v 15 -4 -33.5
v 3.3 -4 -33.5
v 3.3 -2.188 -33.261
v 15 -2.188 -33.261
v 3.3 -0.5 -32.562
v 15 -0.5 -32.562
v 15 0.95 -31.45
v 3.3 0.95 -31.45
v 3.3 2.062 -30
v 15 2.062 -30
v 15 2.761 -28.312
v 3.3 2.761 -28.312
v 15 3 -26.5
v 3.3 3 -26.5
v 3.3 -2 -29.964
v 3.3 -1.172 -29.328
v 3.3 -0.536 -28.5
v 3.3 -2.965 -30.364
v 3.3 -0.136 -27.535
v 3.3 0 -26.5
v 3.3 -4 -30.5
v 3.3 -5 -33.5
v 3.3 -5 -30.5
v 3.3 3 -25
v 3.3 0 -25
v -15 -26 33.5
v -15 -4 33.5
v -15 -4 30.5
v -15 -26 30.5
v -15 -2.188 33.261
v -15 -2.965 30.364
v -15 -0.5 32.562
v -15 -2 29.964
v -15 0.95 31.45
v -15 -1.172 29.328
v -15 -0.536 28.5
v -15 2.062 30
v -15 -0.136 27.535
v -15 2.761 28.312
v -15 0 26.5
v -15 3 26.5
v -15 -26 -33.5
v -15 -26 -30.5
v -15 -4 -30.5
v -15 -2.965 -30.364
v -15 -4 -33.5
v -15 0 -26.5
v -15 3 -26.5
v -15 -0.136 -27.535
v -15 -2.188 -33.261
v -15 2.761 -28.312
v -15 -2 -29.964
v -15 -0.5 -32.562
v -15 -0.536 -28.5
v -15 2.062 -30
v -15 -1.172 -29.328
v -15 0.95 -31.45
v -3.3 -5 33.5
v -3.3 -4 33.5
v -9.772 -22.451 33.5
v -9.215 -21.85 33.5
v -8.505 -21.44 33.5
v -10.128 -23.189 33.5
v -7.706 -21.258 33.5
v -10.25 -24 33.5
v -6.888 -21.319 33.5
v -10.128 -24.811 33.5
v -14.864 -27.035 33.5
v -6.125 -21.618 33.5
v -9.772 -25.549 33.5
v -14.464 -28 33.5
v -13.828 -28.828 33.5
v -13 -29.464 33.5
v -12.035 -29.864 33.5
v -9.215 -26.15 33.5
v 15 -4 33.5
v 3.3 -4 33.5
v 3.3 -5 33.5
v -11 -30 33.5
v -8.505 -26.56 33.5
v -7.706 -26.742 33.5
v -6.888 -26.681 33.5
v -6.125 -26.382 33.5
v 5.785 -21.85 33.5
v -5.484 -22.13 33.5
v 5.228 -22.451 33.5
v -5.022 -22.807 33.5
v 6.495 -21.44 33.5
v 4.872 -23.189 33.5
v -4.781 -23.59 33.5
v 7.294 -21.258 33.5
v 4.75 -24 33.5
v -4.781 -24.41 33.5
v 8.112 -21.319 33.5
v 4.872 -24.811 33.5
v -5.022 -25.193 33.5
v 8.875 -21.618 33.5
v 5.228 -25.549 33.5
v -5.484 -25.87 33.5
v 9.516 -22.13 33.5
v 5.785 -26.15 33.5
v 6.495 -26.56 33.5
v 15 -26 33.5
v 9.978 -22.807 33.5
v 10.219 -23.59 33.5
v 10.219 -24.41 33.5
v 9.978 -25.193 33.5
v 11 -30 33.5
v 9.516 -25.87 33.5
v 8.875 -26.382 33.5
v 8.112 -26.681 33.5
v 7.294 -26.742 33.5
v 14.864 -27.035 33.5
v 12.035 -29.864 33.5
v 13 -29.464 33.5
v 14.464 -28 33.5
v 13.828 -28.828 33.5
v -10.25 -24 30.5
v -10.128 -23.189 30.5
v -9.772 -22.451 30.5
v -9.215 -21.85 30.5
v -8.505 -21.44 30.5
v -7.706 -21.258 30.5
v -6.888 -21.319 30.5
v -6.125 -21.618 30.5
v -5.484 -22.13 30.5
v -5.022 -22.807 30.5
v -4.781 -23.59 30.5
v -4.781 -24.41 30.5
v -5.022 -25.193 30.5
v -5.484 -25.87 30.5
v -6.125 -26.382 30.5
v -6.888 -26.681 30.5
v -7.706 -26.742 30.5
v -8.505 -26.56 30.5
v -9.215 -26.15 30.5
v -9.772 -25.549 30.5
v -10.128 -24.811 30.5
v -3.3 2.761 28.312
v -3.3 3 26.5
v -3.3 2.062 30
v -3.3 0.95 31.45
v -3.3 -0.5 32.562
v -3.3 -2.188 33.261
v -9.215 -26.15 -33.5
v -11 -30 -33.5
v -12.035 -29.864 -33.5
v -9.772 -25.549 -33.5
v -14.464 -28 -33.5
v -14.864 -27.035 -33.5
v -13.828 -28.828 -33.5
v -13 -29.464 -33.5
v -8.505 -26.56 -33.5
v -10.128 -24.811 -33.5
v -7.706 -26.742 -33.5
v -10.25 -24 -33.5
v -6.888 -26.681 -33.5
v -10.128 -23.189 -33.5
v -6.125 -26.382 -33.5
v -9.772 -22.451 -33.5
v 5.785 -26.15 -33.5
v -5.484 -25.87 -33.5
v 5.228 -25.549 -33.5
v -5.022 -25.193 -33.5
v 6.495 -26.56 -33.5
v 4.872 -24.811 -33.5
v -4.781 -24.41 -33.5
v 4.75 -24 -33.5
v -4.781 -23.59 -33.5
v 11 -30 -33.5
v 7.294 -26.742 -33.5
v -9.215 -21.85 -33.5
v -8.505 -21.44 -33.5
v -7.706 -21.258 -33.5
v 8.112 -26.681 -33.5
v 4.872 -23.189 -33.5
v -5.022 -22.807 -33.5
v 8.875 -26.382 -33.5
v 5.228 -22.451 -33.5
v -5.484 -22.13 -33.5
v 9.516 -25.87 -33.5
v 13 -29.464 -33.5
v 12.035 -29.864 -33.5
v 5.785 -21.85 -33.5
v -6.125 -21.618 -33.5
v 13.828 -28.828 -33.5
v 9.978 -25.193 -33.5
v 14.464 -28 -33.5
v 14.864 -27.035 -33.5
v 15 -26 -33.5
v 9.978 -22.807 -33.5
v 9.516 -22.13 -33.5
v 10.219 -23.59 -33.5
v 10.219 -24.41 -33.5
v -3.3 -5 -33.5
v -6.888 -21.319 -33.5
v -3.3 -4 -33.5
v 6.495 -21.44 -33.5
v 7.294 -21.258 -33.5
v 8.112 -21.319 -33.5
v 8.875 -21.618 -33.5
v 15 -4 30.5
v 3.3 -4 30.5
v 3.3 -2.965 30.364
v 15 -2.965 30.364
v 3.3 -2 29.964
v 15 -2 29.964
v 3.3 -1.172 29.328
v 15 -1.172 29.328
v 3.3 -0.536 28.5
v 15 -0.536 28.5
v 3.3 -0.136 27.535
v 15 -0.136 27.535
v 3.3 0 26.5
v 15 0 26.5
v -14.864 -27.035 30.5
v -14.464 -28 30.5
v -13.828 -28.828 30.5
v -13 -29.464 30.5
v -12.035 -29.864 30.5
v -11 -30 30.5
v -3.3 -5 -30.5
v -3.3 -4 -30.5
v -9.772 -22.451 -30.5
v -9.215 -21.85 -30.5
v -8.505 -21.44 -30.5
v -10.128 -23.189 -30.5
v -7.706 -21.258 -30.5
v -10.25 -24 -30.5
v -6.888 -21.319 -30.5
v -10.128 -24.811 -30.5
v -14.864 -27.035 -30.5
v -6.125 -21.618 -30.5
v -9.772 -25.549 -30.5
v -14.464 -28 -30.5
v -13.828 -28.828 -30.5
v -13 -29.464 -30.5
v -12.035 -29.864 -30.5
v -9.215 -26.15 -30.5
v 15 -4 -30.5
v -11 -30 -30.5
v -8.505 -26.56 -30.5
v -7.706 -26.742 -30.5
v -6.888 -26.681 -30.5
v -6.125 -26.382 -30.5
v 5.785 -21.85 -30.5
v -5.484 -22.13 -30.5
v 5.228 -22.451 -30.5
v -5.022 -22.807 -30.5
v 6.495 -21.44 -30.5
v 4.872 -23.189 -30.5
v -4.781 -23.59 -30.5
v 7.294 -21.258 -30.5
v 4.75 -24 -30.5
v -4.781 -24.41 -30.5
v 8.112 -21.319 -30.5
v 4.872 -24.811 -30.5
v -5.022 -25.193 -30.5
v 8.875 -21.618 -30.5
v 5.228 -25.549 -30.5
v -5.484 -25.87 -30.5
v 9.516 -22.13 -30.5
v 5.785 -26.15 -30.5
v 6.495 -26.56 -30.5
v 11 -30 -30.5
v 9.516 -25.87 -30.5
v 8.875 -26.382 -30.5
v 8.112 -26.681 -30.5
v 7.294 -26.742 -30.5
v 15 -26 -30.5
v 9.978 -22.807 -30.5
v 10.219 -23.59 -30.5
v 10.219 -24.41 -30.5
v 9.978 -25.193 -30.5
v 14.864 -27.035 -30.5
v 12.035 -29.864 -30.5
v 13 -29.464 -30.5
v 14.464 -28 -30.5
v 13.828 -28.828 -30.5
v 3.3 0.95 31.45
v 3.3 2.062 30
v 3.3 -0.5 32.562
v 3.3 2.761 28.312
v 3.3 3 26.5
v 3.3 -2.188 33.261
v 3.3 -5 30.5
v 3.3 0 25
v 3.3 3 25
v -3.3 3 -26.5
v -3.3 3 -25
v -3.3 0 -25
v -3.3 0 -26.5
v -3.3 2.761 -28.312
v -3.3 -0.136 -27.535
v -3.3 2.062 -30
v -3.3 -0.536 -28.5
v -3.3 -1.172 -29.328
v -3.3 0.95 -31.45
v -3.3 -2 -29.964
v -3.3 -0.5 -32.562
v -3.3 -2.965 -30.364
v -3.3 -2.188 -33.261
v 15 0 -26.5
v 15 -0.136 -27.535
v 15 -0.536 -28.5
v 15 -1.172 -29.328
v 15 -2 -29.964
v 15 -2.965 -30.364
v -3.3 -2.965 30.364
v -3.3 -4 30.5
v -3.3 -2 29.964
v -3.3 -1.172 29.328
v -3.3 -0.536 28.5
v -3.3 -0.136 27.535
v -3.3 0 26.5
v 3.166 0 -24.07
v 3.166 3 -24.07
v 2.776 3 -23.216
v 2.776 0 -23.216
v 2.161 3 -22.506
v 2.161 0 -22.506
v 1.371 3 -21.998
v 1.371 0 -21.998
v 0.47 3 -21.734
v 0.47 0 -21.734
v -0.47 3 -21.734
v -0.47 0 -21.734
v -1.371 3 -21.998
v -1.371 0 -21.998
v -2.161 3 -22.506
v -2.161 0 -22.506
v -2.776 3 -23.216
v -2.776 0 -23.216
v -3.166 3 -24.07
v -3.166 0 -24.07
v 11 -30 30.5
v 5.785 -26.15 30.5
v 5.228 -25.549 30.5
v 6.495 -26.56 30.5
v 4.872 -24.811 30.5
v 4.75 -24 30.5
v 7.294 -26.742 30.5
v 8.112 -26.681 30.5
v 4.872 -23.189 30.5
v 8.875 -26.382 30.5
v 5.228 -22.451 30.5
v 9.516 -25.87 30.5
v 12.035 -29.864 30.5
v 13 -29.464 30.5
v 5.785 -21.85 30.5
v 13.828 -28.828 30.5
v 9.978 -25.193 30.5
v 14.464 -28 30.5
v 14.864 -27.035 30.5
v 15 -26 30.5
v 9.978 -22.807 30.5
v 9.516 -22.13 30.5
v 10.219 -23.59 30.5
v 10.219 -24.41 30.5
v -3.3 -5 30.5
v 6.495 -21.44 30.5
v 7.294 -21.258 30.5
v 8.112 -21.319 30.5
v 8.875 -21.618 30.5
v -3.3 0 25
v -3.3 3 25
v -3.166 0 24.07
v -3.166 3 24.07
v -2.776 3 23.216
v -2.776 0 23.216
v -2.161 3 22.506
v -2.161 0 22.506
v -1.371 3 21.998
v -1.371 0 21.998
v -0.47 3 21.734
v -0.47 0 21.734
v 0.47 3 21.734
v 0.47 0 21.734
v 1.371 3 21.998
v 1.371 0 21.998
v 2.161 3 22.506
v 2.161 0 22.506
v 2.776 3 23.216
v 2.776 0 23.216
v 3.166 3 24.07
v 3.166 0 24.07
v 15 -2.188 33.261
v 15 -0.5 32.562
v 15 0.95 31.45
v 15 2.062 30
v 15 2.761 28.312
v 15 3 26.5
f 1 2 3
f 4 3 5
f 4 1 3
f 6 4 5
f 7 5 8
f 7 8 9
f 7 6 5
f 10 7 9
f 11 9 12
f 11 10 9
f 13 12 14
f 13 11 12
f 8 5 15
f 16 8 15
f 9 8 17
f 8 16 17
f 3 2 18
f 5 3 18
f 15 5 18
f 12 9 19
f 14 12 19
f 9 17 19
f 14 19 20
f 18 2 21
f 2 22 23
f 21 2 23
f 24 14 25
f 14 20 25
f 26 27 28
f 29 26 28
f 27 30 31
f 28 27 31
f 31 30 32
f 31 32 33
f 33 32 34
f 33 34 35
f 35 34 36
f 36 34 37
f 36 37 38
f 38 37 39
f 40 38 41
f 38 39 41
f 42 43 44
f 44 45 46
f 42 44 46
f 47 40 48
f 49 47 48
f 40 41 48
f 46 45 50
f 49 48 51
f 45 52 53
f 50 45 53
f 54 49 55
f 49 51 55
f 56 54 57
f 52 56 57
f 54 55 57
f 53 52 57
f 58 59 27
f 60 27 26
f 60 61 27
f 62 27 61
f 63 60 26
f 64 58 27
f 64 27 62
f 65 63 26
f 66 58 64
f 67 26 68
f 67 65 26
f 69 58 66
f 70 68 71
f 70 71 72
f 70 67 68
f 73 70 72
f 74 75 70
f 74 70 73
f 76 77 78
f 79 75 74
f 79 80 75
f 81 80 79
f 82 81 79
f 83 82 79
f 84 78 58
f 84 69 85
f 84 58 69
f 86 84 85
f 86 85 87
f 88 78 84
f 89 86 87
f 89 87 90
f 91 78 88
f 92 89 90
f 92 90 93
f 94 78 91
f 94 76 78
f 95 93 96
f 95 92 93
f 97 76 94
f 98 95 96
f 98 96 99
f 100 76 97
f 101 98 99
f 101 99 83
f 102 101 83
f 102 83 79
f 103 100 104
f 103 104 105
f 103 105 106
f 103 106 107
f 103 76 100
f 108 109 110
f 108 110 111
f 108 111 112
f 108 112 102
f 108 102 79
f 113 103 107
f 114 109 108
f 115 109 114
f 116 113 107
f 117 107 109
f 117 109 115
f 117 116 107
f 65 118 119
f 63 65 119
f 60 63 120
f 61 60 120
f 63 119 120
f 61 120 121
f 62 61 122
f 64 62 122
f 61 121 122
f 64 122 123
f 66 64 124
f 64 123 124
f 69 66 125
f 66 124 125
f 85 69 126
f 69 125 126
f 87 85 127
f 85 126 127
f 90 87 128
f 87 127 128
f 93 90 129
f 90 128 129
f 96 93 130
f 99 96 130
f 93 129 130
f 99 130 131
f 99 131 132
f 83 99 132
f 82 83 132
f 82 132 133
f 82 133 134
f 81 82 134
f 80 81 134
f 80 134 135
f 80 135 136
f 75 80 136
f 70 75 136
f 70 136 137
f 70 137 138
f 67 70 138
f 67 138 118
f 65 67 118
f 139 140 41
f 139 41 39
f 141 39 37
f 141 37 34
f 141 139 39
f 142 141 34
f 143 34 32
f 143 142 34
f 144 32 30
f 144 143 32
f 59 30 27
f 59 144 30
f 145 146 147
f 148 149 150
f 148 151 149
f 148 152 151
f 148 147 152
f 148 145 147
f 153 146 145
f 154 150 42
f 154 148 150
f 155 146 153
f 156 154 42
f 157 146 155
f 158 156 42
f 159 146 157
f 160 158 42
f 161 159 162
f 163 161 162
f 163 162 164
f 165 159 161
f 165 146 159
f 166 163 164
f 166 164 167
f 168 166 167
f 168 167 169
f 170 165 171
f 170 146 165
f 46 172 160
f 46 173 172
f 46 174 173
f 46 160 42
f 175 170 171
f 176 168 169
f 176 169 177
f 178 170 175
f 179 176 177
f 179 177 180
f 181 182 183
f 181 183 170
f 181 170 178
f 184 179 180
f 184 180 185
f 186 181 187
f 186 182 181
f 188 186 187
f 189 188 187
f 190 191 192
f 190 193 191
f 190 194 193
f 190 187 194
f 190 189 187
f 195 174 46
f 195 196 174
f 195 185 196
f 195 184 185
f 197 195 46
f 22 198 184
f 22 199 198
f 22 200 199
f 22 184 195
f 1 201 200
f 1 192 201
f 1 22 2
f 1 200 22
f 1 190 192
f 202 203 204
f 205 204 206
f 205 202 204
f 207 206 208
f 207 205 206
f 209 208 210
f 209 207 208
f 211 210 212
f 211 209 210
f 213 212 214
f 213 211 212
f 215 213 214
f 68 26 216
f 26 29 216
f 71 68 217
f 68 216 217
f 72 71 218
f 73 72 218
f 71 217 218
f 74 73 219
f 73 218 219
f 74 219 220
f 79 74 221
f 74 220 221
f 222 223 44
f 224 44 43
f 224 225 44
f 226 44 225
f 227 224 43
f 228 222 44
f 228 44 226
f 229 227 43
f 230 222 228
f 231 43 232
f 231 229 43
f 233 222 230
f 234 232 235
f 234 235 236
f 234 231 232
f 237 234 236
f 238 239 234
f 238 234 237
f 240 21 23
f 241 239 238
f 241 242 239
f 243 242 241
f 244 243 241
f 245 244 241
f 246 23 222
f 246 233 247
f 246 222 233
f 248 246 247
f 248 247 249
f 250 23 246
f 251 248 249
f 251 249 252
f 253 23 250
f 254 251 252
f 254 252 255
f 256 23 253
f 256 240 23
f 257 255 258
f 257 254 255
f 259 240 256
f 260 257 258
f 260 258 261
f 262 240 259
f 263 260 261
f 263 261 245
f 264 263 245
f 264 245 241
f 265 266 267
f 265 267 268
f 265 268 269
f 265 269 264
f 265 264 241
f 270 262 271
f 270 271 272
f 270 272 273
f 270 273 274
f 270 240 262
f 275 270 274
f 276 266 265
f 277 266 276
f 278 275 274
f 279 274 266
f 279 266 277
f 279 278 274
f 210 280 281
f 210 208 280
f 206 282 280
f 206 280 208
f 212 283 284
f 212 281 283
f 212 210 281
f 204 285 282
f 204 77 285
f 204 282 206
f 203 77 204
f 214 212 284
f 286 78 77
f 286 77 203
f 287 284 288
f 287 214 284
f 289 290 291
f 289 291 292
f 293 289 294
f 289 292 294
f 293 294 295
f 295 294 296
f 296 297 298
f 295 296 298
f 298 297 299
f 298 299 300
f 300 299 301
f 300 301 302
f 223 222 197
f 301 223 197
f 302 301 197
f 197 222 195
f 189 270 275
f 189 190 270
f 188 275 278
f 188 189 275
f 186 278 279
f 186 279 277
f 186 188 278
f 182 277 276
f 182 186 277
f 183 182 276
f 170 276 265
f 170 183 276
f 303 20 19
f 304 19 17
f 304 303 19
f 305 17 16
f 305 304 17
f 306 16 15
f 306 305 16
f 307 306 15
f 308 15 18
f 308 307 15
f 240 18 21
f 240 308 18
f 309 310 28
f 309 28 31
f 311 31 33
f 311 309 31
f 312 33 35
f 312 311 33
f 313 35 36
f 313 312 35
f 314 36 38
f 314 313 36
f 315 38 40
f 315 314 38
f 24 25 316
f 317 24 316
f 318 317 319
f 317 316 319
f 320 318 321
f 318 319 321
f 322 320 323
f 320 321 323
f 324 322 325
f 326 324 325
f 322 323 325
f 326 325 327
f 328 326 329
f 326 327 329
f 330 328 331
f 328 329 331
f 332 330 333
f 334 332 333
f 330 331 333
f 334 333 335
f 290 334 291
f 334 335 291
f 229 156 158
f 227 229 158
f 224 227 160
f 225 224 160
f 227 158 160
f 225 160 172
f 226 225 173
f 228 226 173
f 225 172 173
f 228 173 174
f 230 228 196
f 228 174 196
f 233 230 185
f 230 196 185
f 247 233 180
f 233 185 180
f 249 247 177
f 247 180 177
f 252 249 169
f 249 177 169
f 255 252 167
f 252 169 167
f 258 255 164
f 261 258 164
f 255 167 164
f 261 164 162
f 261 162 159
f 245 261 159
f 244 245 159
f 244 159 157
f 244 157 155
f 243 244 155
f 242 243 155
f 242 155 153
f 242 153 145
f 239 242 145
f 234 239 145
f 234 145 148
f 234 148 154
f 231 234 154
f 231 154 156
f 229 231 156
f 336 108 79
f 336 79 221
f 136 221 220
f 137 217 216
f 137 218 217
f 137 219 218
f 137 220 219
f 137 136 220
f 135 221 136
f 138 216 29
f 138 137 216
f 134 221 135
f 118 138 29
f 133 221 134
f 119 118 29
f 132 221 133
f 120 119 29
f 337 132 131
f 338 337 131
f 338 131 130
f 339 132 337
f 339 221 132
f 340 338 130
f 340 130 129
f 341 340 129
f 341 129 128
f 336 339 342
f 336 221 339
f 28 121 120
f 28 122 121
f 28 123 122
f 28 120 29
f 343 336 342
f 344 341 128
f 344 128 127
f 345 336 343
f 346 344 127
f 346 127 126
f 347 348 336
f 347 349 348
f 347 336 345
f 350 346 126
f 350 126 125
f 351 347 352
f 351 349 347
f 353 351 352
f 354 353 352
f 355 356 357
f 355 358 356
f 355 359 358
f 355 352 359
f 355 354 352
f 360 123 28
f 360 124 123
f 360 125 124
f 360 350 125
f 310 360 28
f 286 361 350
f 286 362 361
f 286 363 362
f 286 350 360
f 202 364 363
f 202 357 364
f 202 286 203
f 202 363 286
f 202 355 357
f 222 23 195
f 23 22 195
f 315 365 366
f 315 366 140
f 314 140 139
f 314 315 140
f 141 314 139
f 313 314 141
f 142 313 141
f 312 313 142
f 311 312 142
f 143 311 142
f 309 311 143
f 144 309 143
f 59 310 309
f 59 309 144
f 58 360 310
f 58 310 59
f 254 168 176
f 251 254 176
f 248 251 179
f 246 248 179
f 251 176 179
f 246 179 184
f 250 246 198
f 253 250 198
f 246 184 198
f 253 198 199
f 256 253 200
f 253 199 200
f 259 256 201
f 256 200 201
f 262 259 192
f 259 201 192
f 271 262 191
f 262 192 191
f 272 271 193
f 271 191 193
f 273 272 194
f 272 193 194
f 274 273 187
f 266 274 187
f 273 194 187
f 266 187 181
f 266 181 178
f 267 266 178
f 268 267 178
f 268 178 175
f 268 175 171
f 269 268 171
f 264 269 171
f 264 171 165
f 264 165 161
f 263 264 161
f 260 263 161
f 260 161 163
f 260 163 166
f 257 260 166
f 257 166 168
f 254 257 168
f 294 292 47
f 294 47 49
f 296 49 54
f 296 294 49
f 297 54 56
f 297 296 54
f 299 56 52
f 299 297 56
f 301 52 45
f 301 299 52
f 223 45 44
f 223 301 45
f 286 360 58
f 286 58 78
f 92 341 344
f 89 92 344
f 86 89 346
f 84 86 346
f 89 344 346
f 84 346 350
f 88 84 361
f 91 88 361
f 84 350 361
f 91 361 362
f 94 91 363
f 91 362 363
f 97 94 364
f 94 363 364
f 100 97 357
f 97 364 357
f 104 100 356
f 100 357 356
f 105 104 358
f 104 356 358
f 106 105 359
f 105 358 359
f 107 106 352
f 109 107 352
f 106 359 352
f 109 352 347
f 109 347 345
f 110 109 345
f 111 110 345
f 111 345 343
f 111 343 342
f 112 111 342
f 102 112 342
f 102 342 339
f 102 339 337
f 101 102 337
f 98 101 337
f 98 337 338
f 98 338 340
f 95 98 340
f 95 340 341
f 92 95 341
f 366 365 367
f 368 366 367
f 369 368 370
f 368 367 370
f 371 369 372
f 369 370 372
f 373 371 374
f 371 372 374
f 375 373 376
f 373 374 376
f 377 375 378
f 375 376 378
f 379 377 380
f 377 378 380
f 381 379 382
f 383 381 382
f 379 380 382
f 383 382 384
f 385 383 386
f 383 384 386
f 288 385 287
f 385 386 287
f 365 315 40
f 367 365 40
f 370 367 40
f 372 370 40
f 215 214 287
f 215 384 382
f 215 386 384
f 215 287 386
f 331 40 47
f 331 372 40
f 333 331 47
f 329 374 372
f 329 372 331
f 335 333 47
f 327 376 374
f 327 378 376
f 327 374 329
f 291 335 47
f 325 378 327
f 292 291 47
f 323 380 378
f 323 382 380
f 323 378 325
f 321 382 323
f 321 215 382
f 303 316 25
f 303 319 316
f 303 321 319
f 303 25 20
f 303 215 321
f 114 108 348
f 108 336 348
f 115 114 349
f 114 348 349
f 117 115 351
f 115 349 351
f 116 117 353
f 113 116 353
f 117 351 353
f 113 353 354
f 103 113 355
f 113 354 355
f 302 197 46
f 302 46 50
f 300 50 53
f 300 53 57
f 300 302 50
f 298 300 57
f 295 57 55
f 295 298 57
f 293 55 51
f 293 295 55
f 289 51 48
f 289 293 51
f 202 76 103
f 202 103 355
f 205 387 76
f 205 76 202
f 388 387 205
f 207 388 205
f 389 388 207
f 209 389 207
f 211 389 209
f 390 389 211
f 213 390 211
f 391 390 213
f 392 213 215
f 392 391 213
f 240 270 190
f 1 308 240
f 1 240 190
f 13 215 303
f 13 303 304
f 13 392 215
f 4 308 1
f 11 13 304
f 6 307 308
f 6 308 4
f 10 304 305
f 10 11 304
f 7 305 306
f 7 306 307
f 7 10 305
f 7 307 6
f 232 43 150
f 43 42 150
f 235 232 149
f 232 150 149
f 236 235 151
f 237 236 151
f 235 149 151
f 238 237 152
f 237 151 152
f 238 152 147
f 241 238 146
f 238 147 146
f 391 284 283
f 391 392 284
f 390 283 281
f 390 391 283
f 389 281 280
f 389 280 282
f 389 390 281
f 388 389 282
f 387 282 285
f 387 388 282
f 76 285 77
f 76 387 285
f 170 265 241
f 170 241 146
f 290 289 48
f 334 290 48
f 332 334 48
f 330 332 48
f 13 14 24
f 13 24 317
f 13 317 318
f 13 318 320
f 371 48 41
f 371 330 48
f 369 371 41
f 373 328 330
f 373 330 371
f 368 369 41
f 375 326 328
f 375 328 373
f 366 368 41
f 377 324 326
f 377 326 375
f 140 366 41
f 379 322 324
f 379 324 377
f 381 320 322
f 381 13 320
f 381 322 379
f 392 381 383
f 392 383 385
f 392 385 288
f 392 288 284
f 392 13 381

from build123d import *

# Parameters (mm, degrees)
ODGI_CIE_BAZOWE1_DEPTH     = 15
OTW_R_POD_RUB_M51_D        = 5.5
ZAOKR_GLENIE1_R            = 4
OTW_R_POD_RUB_M61_D        = 6.6
WYTNIJ_WYCI_GNI_CIE2_START = -8
WYTNIJ_WYCI_GNI_CIE2_DEPTH = 8


# Sheet-metal steps are written as plain solids
with BuildPart() as part:
    # Szkic1 → Odgięcie bazowe1 (new, symmetric)
    with BuildSketch(Plane(origin=(0, 0, 0), x_dir=(0, 0, -1), z_dir=(1, 0, 0))):
        with BuildLine():
            Line((-30.5, -30), (-30.5, -4))
            ThreePointArc((-30.5, -4), (-29.328427125, -1.171572875), (-26.5, 0))
            Line((-26.5, 0), (26.5, 0))
            ThreePointArc((26.5, 0), (29.328427125, -1.171572875), (30.5, -4))
            Line((30.5, -4), (30.5, -30))
            Line((30.5, -30), (33.5, -30))
            Line((33.5, -30), (33.5, -4))
            ThreePointArc((33.5, -4), (31.449747468, 0.949747468), (26.5, 3))
            Line((26.5, 3), (-26.5, 3))
            ThreePointArc((-26.5, 3), (-31.449747468, 0.949747468), (-33.5, -4))
            Line((-33.5, -4), (-33.5, -30))
            Line((-33.5, -30), (-30.5, -30))
        make_face()
    extrude(amount=ODGI_CIE_BAZOWE1_DEPTH, both=True)

    # Otwór pod śrubę M51 (through all)
    with Locations(Plane.XY.offset(33.5)):
        with Locations((-7.5, -24), (7.5, -24)):
            Hole(OTW_R_POD_RUB_M51_D / 2)

    # Zaokrąglenie1
    zaokr_glenie1_edges = [part.edges().sort_by_distance(p)[0] for p in [
        (15, -30, -32),
        (15, -30, 32),
        (-15, -30, -32),
        (-15, -30, 32),
    ]]
    fillet(zaokr_glenie1_edges, radius=ZAOKR_GLENIE1_R)

    # Otwór pod śrubę M61 (through all)
    with Locations(Plane(origin=(0, 3, 0), x_dir=(1, 0, 0), z_dir=(0, 1, 0))):
        with Locations((0, 25), (0, -25)):
            Hole(OTW_R_POD_RUB_M61_D / 2)

    # Szkic10 → Wytnij-wyciągnięcie2 (cut)
    with BuildSketch(Plane(origin=(0, 3, 0), x_dir=(1, 0, 0), z_dir=(0, 1, 0)).offset(WYTNIJ_WYCI_GNI_CIE2_START)):
        with BuildLine():
            Line((-3.3, 25), (-3.3, 33.5))
            ThreePointArc((-3.3, 33.5), (0, 36.8), (3.3, 33.5))
            Line((3.3, 33.5), (3.3, 25))
            ThreePointArc((3.3, 25), (0, 21.7), (-3.3, 25))
        make_face()
        with BuildLine():
            Line((-3.3, -25), (-3.3, -33.5))
            ThreePointArc((-3.3, -33.5), (0, -36.8), (3.3, -33.5))
            Line((3.3, -33.5), (3.3, -25))
            ThreePointArc((3.3, -25), (0, -21.7), (-3.3, -25))
        make_face()
    extrude(amount=WYTNIJ_WYCI_GNI_CIE2_DEPTH, mode=Mode.SUBTRACT)


solid = part.part
